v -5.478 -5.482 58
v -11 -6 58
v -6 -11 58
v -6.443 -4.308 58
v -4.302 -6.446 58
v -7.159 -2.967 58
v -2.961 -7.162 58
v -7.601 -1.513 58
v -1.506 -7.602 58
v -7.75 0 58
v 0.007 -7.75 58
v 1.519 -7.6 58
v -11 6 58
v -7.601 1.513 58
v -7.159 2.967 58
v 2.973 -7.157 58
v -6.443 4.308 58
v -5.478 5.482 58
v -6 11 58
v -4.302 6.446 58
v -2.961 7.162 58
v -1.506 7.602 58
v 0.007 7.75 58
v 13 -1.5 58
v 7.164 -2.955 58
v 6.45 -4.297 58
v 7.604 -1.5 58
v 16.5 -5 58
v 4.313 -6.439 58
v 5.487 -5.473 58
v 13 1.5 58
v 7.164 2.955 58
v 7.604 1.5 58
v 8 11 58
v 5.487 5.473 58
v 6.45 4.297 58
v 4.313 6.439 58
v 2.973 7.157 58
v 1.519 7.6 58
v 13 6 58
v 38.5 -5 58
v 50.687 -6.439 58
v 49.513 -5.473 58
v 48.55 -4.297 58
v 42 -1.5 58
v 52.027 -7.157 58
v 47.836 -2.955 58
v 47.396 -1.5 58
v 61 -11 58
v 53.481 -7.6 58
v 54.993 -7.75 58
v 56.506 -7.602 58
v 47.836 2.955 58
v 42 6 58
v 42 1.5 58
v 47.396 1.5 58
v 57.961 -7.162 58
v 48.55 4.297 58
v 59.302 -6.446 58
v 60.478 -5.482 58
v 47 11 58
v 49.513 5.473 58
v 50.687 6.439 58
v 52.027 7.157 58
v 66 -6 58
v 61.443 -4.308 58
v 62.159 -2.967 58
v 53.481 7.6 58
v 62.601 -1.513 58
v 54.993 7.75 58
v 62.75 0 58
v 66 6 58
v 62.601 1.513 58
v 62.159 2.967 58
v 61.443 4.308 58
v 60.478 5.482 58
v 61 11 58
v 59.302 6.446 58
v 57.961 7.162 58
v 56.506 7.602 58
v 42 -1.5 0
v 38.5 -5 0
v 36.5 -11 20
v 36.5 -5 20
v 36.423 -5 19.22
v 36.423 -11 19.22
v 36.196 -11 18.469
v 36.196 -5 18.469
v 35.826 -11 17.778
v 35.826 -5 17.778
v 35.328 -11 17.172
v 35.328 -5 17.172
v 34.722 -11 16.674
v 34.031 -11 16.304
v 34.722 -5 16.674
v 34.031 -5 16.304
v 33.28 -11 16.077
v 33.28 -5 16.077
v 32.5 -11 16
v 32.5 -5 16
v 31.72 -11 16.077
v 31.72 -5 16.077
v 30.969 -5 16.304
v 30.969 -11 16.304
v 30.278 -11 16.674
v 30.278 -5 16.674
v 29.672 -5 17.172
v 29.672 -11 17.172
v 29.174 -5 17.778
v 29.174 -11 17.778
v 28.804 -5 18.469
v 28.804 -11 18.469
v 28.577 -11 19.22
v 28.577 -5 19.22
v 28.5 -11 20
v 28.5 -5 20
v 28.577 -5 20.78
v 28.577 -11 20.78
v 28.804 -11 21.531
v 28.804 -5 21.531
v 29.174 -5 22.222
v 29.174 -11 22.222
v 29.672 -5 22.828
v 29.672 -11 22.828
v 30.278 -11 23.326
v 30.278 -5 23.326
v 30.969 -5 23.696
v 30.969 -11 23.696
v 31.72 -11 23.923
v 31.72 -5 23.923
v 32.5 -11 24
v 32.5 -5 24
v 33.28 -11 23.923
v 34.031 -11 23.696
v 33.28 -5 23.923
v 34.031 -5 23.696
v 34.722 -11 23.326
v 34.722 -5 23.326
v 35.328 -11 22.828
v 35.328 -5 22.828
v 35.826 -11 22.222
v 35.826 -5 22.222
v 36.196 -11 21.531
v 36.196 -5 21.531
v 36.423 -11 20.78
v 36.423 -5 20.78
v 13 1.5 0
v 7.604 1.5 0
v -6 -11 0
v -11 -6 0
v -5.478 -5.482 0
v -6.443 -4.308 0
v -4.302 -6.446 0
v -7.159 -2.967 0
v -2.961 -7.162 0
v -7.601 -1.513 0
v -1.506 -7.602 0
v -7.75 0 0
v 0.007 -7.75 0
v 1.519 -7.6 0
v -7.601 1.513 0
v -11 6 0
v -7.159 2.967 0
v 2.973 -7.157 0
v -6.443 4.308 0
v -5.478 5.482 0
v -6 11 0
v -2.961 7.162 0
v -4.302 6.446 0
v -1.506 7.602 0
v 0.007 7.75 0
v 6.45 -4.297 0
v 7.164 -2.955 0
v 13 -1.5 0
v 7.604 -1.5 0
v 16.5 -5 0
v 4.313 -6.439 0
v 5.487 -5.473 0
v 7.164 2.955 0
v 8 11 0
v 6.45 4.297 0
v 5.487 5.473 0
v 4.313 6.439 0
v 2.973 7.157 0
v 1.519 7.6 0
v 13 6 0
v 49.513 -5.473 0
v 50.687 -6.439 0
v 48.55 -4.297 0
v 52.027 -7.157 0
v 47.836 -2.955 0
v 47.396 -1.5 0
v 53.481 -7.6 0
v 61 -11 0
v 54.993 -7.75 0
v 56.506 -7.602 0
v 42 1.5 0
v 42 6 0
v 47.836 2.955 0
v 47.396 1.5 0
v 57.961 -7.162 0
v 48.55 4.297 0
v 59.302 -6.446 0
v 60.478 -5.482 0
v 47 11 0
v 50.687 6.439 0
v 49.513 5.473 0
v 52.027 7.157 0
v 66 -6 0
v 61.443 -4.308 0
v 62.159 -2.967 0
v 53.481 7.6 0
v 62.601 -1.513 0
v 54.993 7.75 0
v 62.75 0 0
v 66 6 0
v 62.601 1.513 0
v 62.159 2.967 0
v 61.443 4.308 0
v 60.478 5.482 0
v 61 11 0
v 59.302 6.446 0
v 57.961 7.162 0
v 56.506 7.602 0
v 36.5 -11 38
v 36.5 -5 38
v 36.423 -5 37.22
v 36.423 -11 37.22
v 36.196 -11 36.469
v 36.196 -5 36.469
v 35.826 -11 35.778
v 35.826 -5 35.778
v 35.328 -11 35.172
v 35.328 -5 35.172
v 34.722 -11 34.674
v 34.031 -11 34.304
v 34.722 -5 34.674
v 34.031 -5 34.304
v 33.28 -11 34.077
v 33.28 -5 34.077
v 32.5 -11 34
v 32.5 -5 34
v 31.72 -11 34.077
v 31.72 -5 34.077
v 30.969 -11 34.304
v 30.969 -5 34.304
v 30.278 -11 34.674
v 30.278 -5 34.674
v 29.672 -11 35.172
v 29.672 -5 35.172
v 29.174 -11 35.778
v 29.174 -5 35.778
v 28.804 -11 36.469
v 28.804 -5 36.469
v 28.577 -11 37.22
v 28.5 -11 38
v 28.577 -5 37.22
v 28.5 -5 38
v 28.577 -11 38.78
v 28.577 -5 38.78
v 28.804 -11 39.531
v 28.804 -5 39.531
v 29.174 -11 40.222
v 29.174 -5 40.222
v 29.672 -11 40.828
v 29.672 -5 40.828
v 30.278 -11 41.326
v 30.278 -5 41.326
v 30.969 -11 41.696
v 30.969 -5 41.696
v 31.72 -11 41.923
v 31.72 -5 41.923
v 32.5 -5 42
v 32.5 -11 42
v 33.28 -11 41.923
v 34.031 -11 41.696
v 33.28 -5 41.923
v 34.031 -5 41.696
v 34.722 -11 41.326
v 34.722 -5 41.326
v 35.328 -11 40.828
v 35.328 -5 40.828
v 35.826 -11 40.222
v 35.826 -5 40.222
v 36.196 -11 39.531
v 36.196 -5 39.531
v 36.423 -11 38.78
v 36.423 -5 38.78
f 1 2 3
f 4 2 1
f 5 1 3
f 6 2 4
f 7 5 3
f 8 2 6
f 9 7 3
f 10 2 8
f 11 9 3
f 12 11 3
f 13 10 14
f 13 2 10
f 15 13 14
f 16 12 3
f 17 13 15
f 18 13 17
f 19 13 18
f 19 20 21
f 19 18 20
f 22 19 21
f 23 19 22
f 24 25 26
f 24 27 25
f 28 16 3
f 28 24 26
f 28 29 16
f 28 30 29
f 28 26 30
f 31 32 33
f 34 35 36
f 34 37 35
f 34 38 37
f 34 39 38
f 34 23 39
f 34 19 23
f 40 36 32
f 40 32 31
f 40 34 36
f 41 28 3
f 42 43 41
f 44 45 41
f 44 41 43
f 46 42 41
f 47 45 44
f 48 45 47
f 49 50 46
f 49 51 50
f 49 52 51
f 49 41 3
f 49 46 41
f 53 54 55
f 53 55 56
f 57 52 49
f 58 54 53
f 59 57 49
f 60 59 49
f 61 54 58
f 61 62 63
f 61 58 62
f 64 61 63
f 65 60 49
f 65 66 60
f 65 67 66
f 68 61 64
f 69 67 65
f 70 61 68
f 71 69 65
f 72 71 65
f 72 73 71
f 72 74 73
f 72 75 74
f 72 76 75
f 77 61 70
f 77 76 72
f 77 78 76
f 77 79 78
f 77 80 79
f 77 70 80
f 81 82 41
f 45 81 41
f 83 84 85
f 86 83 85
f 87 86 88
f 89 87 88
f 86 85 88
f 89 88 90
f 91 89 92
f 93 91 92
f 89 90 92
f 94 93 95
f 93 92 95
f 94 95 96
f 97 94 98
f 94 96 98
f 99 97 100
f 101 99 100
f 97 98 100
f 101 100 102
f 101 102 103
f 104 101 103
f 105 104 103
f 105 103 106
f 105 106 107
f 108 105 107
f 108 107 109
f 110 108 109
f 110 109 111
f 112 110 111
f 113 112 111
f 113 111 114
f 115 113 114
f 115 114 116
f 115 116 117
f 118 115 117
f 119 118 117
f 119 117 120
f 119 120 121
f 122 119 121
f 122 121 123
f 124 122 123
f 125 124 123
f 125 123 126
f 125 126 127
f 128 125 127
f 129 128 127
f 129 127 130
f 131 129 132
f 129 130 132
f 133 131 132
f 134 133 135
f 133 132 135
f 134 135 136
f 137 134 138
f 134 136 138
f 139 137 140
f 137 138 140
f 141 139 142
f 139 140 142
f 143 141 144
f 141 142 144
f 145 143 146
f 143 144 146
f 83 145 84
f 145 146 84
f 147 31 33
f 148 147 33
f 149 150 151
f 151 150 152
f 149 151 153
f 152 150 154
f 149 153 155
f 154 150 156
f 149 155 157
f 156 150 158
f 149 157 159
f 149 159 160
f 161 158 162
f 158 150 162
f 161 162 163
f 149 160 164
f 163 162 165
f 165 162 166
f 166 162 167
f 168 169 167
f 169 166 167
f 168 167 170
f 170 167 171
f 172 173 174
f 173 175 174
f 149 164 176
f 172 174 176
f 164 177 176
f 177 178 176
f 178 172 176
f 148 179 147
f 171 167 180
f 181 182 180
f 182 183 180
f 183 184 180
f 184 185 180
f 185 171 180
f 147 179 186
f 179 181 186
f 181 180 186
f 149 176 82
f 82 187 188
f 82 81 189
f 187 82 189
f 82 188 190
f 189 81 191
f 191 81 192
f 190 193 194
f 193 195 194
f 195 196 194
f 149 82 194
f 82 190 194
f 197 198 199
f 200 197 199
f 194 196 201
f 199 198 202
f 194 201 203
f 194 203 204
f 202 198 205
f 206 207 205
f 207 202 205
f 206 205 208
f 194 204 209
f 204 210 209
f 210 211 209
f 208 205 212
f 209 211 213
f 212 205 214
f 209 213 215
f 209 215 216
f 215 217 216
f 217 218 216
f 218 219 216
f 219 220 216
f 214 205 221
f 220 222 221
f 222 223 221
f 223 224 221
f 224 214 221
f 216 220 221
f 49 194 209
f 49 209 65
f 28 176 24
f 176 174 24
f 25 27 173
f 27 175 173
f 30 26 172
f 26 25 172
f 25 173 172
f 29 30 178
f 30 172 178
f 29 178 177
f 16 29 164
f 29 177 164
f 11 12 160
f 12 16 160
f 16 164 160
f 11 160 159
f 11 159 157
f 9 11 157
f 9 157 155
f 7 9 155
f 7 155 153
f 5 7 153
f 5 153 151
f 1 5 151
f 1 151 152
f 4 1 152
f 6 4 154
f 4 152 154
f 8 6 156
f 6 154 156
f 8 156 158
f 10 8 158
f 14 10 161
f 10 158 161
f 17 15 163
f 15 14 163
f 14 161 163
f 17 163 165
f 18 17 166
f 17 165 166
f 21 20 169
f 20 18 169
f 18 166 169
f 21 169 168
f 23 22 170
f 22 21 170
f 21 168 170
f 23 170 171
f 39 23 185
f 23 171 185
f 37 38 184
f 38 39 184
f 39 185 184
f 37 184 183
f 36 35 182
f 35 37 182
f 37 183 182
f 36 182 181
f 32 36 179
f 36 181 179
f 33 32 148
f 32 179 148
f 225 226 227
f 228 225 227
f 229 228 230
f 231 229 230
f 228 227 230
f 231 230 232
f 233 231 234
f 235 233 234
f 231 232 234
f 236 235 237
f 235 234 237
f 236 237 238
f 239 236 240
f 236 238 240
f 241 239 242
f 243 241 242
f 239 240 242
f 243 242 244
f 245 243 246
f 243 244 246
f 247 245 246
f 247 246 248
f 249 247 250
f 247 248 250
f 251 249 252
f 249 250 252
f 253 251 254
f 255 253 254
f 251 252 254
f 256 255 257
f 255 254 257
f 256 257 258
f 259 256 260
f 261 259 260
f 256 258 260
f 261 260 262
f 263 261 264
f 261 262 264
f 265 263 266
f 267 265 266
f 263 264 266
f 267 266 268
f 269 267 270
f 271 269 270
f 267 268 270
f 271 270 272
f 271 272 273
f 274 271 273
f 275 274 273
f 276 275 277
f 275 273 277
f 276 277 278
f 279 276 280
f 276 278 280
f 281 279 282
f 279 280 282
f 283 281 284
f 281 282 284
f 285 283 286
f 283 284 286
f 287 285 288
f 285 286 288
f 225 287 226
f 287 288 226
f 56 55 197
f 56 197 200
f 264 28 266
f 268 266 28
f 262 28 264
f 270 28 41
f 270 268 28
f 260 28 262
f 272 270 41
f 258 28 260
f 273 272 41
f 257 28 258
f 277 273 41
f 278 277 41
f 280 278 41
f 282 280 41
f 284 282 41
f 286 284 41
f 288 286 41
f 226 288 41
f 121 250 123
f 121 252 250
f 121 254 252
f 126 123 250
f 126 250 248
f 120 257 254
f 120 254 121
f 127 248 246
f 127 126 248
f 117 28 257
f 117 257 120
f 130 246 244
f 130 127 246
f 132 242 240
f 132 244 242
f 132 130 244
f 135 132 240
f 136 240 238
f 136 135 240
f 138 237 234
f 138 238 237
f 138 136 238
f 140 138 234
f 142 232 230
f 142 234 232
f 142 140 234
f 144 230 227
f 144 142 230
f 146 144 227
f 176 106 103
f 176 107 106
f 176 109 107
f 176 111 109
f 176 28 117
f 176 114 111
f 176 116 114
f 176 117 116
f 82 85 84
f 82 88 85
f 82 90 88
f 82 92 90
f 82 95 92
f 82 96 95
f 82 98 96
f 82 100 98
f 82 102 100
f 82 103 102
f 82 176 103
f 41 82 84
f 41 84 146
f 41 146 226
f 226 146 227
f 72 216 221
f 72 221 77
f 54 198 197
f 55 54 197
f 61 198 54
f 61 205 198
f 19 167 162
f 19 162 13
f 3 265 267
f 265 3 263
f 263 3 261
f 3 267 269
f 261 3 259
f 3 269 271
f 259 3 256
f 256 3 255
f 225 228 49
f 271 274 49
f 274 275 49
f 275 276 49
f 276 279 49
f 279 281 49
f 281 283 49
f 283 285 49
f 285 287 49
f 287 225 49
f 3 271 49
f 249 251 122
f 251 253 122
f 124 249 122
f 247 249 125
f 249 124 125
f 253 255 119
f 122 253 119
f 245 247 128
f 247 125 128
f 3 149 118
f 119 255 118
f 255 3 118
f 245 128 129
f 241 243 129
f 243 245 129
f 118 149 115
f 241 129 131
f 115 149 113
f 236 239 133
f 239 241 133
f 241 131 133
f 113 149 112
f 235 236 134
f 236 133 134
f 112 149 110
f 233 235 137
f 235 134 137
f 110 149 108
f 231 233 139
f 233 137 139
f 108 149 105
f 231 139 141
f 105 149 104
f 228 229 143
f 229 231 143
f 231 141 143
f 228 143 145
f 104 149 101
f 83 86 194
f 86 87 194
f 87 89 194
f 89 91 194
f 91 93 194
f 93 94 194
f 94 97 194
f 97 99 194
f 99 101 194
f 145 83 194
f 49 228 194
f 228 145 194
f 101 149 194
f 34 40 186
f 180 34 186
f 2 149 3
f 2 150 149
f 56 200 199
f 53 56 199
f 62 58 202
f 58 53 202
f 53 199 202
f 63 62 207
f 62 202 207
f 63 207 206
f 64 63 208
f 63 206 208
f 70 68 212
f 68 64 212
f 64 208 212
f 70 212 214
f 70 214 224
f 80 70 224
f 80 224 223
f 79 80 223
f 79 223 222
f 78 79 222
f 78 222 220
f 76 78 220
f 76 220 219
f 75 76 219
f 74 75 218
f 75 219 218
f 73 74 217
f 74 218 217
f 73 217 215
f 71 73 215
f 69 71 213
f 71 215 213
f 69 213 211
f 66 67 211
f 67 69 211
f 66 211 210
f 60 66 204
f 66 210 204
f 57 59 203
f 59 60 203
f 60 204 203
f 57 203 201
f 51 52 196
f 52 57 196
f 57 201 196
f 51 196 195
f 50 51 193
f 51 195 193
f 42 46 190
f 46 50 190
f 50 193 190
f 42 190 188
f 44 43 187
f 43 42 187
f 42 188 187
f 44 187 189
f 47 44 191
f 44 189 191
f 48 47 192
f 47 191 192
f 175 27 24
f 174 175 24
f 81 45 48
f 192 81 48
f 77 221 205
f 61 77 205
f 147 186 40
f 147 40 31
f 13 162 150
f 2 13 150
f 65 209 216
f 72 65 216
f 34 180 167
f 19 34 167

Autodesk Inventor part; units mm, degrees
ref_plane "YZ Plane" through (0, 0, 0) normal (1, 0, 0) x (0, 1, 0)
ref_plane "XZ Plane" through (0, 0, 0) normal (0, 1, 0) x (-1, 0, 0)
ref_plane "XY Plane" through (0, 0, 0) normal (0, 0, 1) x (1, 0, 0)
sketch "Sketch1" plane through (0, 0, 0) normal (0, 0, 1) x (1, 0, 0)
  arc A0 (7.6035, 1.5) -> (7.6035, -1.5) centre (0, 0) ccw
  arc A1 (47.3965, -1.5) -> (47.3965, 1.5) centre (55, 0) ccw
  line L0 (-11, -11) -> (66, -11)
  line L1 (66, -11) -> (66, 11)
  line L2 (66, 11) -> (42, 11)
  line L3 (42, 11) -> (42, 1.5)
  line L4 (42, 1.5) -> (47.3965, 1.5)
  line L5 (13, 11) -> (-11, 11)
  line L6 (-11, 11) -> (-11, -11)
  line L7 (13, 11) -> (13, 1.5)
  line L8 (13, 1.5) -> (7.6035, 1.5)
  line L9 (7.6035, -1.5) -> (13, -1.5)
  line L10 (13, -1.5) -> (13, -5)
  line L11 (13, -5) -> (42, -5)
  line L12 (42, -5) -> (42, -1.5)
  line L13 (42, -1.5) -> (47.3965, -1.5)
  dimension "d0" = 15.5
  dimension "d1" = 55
  dimension "d2" = 11
  dimension "d3" = 11
  dimension "d4" = 11
  dimension "d7" = 1.5
  dimension "d8" = 1.5
  dimension "d9" = 13
  dimension "d10" = 13
  dimension "d11" = 6
extrude "Extrusion1" add sketch "Sketch1" along normal blind 58
chamfer "Chamfer1" distance 5 angle 45 6 edges at (-11, 11, 29) (-11, -11, 29) (66, 11, 29) (66, -11, 29) (42, 11, 29) (13, 11, 29)
chamfer "Chamfer2" distance 3.5 angle 45 2 edges at (42, -5, 29) (13, -5, 29)
sketch "Sketch2" plane through (16.5, -5, 0) normal (0, 1, 0) x (1, 0, 0)
  line L0 (22, 0) -> (22, -58) projected
  line L1 (22, 0) -> (0, 0) projected
  circle A0 centre (16, -20) radius 4
  circle A1 centre (16, -38) radius 4
  point P0 (-16.5, 0)
  dimension "d20" = 8
  dimension "d21" = 6
  dimension "d22" = 20
  dimension "d23" = 18
extrude "Extrusion2" cut sketch "Sketch2" against normal up to next
properties part number "ChimeraXCarriageLowTest"
